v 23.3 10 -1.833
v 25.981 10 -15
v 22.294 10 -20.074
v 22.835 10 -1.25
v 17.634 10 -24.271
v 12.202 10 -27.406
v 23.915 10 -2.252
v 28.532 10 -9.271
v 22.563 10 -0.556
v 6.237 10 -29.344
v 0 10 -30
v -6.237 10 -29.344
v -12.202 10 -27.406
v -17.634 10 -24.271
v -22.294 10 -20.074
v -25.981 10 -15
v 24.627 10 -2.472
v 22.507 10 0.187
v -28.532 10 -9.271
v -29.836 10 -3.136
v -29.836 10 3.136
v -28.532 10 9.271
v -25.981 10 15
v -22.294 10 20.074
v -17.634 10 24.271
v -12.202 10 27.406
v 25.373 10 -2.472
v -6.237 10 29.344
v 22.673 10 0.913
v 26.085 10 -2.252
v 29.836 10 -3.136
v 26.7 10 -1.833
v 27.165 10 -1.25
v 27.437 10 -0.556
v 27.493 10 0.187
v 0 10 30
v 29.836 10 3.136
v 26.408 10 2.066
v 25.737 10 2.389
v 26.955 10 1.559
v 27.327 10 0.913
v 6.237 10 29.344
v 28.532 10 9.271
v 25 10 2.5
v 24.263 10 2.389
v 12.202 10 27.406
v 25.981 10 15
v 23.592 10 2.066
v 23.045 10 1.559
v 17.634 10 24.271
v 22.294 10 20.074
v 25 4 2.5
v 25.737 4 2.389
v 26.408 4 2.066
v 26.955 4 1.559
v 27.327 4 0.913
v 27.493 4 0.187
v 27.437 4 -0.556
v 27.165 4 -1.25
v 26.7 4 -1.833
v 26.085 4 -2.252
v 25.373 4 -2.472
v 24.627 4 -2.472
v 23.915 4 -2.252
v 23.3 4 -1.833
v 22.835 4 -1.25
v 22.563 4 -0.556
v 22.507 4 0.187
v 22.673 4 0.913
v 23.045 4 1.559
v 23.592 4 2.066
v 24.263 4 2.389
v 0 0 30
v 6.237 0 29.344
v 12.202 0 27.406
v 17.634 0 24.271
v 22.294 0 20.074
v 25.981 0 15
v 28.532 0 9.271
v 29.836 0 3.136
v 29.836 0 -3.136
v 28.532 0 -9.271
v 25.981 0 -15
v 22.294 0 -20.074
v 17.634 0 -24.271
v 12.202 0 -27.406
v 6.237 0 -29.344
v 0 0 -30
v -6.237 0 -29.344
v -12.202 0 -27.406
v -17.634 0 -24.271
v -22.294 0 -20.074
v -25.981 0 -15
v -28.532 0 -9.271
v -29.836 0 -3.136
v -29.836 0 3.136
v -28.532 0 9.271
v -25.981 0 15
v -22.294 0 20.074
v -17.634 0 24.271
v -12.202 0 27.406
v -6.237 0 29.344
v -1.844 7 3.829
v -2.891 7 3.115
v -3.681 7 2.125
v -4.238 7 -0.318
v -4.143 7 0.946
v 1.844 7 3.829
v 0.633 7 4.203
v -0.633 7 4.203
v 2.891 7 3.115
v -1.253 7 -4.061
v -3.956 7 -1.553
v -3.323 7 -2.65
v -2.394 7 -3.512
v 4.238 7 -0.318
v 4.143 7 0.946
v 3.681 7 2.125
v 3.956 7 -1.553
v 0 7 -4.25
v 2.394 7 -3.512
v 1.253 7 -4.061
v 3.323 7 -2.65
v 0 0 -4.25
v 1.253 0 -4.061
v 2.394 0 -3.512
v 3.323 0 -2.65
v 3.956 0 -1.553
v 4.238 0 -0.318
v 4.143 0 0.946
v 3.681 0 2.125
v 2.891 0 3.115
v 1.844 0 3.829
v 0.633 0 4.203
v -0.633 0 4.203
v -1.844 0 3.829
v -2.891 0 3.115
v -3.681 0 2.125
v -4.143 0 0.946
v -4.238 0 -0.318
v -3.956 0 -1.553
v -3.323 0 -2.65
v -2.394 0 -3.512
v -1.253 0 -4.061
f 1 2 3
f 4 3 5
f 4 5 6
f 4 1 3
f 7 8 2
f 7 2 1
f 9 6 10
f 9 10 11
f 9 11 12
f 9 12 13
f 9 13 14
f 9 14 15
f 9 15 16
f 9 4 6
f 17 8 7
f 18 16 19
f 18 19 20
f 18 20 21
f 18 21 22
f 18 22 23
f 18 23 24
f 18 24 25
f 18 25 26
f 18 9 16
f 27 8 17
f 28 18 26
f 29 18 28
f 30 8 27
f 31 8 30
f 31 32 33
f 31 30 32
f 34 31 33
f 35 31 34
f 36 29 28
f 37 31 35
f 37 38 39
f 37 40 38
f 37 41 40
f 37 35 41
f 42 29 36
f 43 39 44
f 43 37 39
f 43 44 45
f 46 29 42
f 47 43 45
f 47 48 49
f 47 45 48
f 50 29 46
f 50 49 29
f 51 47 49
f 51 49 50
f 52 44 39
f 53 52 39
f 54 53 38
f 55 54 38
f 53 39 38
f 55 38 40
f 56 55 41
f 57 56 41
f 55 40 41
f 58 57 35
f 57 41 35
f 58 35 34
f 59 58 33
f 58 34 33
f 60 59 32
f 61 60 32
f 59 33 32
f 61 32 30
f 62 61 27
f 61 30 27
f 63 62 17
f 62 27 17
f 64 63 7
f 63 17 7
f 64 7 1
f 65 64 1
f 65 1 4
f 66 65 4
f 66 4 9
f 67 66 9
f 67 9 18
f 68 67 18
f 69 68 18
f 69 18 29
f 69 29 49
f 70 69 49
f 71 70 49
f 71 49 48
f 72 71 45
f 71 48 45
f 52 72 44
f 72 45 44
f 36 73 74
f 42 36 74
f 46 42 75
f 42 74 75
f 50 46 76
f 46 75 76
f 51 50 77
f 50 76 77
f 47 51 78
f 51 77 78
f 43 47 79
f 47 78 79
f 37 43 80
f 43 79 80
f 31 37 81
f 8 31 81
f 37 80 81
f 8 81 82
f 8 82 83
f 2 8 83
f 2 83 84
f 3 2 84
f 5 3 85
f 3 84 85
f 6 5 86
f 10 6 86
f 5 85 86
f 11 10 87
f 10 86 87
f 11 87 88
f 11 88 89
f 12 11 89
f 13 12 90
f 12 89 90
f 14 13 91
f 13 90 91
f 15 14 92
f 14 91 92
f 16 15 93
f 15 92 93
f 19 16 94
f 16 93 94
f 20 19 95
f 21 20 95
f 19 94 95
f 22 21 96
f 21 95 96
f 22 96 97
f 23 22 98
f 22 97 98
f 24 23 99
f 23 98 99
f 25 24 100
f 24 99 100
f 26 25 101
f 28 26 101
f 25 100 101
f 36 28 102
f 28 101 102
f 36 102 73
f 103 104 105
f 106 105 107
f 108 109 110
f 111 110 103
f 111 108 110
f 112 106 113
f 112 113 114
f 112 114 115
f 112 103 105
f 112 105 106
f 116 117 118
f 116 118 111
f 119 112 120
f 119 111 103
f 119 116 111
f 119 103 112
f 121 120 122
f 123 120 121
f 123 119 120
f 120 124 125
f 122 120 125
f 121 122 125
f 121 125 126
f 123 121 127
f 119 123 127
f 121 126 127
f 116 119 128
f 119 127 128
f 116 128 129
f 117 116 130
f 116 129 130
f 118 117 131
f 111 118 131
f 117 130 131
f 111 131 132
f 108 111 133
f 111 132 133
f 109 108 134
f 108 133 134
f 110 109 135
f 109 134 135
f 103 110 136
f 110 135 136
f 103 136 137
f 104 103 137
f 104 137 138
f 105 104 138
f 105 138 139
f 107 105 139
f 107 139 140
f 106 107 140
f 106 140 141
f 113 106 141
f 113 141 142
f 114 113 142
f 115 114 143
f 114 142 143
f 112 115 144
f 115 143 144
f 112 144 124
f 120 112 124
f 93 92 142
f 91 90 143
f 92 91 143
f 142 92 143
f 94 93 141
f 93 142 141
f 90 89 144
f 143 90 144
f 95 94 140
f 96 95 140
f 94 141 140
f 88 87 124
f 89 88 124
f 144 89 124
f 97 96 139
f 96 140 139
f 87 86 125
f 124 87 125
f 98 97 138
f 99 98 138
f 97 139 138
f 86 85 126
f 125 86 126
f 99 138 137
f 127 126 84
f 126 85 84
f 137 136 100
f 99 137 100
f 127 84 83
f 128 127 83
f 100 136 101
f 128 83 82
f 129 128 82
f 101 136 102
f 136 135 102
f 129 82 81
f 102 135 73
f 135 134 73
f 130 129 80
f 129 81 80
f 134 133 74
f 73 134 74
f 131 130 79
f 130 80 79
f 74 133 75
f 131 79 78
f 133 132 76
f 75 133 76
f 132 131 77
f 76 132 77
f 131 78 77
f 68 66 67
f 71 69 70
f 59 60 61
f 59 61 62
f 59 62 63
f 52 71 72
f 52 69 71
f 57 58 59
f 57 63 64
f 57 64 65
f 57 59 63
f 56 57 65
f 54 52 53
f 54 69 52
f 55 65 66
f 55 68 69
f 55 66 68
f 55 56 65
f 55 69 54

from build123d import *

# Parameters (mm, degrees)
SKETCH1_R           = 30
BOSS_EXTRUDE1_DEPTH = 10
SKETCH2_R           = 4.25
CUT_EXTRUDE1_DEPTH  = 7
SKETCH3_R           = 2.5
CUT_EXTRUDE2_DEPTH  = 6


with BuildPart() as part:
    # Sketch1 → Boss-Extrude1 (new body)
    with BuildSketch(Plane(origin=(0, 0, 0), x_dir=(1, 0, 0), z_dir=(0, 1, 0))):
        with Locations(Location((0, 0, 0), (0, 0, 270))):
            Circle(SKETCH1_R)
    extrude(amount=BOSS_EXTRUDE1_DEPTH)

    # Sketch2 → Cut-Extrude1 (cut)
    with BuildSketch(Plane.XZ):
        with Locations(Location((0, 0, 0), (0, 0, 270))):
            Circle(SKETCH2_R)
    extrude(amount=-CUT_EXTRUDE1_DEPTH, mode=Mode.SUBTRACT)

    # Sketch3 → Cut-Extrude2 (cut)
    with BuildSketch(Plane(origin=(0, 10, 0), x_dir=(1, 0, 0), z_dir=(0, 1, 0))):
        with Locations(Location((25, 0, 0), (0, 0, 270))):
            Circle(SKETCH3_R)
    extrude(amount=-CUT_EXTRUDE2_DEPTH, mode=Mode.SUBTRACT)


solid = part.part
